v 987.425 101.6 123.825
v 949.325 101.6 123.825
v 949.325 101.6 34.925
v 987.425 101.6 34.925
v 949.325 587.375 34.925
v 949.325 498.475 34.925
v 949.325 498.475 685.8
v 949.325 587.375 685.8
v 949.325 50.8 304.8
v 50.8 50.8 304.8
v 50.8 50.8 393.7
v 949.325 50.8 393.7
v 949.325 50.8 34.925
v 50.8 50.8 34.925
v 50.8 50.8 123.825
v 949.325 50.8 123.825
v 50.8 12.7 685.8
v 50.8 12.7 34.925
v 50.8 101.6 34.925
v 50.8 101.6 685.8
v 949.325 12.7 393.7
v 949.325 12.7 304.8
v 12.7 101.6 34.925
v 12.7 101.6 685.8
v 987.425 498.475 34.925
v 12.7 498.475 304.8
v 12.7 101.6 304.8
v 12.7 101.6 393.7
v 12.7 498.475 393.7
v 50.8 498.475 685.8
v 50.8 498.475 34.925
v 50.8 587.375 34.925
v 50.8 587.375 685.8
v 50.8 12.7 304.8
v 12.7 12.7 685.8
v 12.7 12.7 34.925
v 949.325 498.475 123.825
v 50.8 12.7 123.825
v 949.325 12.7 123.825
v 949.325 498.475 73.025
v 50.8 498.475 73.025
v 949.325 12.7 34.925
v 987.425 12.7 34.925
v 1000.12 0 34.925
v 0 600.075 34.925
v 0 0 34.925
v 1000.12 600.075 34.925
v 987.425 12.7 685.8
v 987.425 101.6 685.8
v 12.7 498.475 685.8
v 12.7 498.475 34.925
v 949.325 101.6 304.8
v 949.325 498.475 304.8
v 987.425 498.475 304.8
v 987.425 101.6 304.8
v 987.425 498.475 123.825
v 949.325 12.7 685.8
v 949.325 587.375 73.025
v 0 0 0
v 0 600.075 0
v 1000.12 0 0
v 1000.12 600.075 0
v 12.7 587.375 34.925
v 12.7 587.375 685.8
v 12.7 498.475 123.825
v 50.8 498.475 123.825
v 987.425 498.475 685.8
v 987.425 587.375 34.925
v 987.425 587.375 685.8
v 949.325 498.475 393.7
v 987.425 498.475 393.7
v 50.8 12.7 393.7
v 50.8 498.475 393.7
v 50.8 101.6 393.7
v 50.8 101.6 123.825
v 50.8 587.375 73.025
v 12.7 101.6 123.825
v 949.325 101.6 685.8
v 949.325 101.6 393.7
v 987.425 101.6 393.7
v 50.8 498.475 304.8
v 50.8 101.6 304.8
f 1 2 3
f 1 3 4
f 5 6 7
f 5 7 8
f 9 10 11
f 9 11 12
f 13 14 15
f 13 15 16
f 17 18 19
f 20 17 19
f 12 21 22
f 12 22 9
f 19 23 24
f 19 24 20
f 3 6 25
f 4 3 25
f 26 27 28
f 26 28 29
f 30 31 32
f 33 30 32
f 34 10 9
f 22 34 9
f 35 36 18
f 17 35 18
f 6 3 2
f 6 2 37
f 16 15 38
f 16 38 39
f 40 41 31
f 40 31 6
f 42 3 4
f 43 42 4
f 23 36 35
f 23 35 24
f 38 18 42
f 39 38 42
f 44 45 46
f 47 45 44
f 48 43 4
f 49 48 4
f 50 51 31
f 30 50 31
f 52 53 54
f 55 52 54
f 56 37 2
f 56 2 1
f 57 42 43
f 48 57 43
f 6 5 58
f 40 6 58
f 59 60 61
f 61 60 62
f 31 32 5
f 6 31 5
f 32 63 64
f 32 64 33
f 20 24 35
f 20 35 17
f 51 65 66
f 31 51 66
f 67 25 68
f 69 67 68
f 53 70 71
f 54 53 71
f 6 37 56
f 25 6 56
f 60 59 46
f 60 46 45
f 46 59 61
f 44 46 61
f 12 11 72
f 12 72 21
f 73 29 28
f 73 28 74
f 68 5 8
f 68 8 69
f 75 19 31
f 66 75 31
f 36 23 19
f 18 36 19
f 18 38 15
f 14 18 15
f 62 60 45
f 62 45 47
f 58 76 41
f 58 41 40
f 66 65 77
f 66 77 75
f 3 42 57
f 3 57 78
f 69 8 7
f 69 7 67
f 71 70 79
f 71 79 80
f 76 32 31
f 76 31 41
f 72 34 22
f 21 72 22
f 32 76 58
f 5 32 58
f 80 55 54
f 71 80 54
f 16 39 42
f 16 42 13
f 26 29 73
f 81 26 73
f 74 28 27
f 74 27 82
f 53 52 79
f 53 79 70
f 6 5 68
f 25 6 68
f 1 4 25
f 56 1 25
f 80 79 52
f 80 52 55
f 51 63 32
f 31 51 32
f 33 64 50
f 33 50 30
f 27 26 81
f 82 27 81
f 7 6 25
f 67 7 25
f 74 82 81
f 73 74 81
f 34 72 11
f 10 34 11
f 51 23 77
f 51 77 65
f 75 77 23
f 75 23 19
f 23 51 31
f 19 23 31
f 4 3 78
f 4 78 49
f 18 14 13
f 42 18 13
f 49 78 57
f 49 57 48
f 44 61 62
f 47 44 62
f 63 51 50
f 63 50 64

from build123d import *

# Parameters (mm, degrees)
BOX_W        = 1000.12
BOX_H        = 600.075
BOX_DEPTH    = 34.925
BOX001_W     = 38.1
BOX001_H     = 88.9
BOX001_DEPTH = 650.875
BOX002_W     = 38.1
BOX002_H     = 88.9
BOX002_DEPTH = 650.875
BOX003_W     = 38.1
BOX003_H     = 88.9
BOX003_DEPTH = 650.875
BOX004_W     = 38.1
BOX004_H     = 88.9
BOX004_DEPTH = 650.875
BOX005_W     = 898.525
BOX005_H     = 38.1
BOX005_DEPTH = 88.9
BOX006_W     = 898.525
BOX006_H     = 38.1
BOX006_DEPTH = 88.9
BOX007_W     = 38.1
BOX007_H     = 396.875
BOX007_DEPTH = 88.9
BOX008_W     = 38.1
BOX008_H     = 396.875
BOX008_DEPTH = 88.9
BOX009_W     = 38.1
BOX009_H     = 396.875
BOX009_DEPTH = 88.9
BOX010_W     = 38.1
BOX010_H     = 396.875
BOX010_DEPTH = 88.9
BOX011_W     = 898.525
BOX011_H     = 38.1
BOX011_DEPTH = 88.9


with BuildPart() as tabletop:
    # Box → Box (new body)
    with BuildSketch(Plane.XY):
        with Locations((500.06, 300.0375)):
            Rectangle(BOX_W, BOX_H)
    extrude(amount=BOX_DEPTH)


with BuildPart() as leg_back_right:
    # Box001 → Box001 (new body)
    with BuildSketch(Plane(origin=(12.7, 12.7, 34.925), x_dir=(1, 0, 0), z_dir=(0, 0, 1))):
        with Locations((19.05, 44.45)):
            Rectangle(BOX001_W, BOX001_H)
    extrude(amount=BOX001_DEPTH)


with BuildPart() as leg_front_right:
    # Box002 → Box002 (new body)
    with BuildSketch(Plane(origin=(12.7, 498.475, 34.925), x_dir=(1, 0, 0), z_dir=(0, 0, 1))):
        with Locations((19.05, 44.45)):
            Rectangle(BOX002_W, BOX002_H)
    extrude(amount=BOX002_DEPTH)


with BuildPart() as leg_front_left:
    # Box003 → Box003 (new body)
    with BuildSketch(Plane(origin=(949.325, 498.475, 34.925), x_dir=(1, 0, 0), z_dir=(0, 0, 1))):
        with Locations((19.05, 44.45)):
            Rectangle(BOX003_W, BOX003_H)
    extrude(amount=BOX003_DEPTH)


with BuildPart() as leg_back_left:
    # Box004 → Box004 (new body)
    with BuildSketch(Plane(origin=(949.325, 12.7, 34.925), x_dir=(1, 0, 0), z_dir=(0, 0, 1))):
        with Locations((19.05, 44.45)):
            Rectangle(BOX004_W, BOX004_H)
    extrude(amount=BOX004_DEPTH)


with BuildPart() as back_lower_brace:
    # Box005 → Box005 (new body)
    with BuildSketch(Plane(origin=(50.8, 12.7, 304.8), x_dir=(1, 0, 0), z_dir=(0, 0, 1))):
        with Locations((449.2625, 19.05)):
            Rectangle(BOX005_W, BOX005_H)
    extrude(amount=BOX005_DEPTH)


with BuildPart() as back_upper_brace:
    # Box006 → Box006 (new body)
    with BuildSketch(Plane(origin=(50.8, 12.7, 34.925), x_dir=(1, 0, 0), z_dir=(0, 0, 1))):
        with Locations((449.2625, 19.05)):
            Rectangle(BOX006_W, BOX006_H)
    extrude(amount=BOX006_DEPTH)


with BuildPart() as side_right_lower_brace:
    # Box007 → Box007 (new body)
    with BuildSketch(Plane(origin=(12.7, 101.6, 304.8), x_dir=(1, 0, 0), z_dir=(0, 0, 1))):
        with Locations((19.05, 198.4375)):
            Rectangle(BOX007_W, BOX007_H)
    extrude(amount=BOX007_DEPTH)


with BuildPart() as side_right_upper_brace:
    # Box008 → Box008 (new body)
    with BuildSketch(Plane(origin=(12.7, 101.6, 34.925), x_dir=(1, 0, 0), z_dir=(0, 0, 1))):
        with Locations((19.05, 198.4375)):
            Rectangle(BOX008_W, BOX008_H)
    extrude(amount=BOX008_DEPTH)


with BuildPart() as side_left_upper_brace:
    # Box009 → Box009 (new body)
    with BuildSketch(Plane(origin=(949.325, 101.6, 34.925), x_dir=(1, 0, 0), z_dir=(0, 0, 1))):
        with Locations((19.05, 198.4375)):
            Rectangle(BOX009_W, BOX009_H)
    extrude(amount=BOX009_DEPTH)


with BuildPart() as side_left_lower_brace:
    # Box010 → Box010 (new body)
    with BuildSketch(Plane(origin=(949.325, 101.6, 304.8), x_dir=(1, 0, 0), z_dir=(0, 0, 1))):
        with Locations((19.05, 198.4375)):
            Rectangle(BOX010_W, BOX010_H)
    extrude(amount=BOX010_DEPTH)


with BuildPart() as front_upper_brace:
    # Box011 → Box011 (new body)
    with BuildSketch(Plane(origin=(50.8, 587.375, 34.925), x_dir=(1, 0, 0), z_dir=(0, -1, 0))):
        with Locations((449.2625, 19.05)):
            Rectangle(BOX011_W, BOX011_H)
    extrude(amount=BOX011_DEPTH)


solid = Compound([tabletop.part, leg_back_right.part, leg_front_right.part, leg_front_left.part, leg_back_left.part, back_lower_brace.part, back_upper_brace.part, side_right_lower_brace.part, side_right_upper_brace.part, side_left_upper_brace.part, side_left_lower_brace.part, front_upper_brace.part])
